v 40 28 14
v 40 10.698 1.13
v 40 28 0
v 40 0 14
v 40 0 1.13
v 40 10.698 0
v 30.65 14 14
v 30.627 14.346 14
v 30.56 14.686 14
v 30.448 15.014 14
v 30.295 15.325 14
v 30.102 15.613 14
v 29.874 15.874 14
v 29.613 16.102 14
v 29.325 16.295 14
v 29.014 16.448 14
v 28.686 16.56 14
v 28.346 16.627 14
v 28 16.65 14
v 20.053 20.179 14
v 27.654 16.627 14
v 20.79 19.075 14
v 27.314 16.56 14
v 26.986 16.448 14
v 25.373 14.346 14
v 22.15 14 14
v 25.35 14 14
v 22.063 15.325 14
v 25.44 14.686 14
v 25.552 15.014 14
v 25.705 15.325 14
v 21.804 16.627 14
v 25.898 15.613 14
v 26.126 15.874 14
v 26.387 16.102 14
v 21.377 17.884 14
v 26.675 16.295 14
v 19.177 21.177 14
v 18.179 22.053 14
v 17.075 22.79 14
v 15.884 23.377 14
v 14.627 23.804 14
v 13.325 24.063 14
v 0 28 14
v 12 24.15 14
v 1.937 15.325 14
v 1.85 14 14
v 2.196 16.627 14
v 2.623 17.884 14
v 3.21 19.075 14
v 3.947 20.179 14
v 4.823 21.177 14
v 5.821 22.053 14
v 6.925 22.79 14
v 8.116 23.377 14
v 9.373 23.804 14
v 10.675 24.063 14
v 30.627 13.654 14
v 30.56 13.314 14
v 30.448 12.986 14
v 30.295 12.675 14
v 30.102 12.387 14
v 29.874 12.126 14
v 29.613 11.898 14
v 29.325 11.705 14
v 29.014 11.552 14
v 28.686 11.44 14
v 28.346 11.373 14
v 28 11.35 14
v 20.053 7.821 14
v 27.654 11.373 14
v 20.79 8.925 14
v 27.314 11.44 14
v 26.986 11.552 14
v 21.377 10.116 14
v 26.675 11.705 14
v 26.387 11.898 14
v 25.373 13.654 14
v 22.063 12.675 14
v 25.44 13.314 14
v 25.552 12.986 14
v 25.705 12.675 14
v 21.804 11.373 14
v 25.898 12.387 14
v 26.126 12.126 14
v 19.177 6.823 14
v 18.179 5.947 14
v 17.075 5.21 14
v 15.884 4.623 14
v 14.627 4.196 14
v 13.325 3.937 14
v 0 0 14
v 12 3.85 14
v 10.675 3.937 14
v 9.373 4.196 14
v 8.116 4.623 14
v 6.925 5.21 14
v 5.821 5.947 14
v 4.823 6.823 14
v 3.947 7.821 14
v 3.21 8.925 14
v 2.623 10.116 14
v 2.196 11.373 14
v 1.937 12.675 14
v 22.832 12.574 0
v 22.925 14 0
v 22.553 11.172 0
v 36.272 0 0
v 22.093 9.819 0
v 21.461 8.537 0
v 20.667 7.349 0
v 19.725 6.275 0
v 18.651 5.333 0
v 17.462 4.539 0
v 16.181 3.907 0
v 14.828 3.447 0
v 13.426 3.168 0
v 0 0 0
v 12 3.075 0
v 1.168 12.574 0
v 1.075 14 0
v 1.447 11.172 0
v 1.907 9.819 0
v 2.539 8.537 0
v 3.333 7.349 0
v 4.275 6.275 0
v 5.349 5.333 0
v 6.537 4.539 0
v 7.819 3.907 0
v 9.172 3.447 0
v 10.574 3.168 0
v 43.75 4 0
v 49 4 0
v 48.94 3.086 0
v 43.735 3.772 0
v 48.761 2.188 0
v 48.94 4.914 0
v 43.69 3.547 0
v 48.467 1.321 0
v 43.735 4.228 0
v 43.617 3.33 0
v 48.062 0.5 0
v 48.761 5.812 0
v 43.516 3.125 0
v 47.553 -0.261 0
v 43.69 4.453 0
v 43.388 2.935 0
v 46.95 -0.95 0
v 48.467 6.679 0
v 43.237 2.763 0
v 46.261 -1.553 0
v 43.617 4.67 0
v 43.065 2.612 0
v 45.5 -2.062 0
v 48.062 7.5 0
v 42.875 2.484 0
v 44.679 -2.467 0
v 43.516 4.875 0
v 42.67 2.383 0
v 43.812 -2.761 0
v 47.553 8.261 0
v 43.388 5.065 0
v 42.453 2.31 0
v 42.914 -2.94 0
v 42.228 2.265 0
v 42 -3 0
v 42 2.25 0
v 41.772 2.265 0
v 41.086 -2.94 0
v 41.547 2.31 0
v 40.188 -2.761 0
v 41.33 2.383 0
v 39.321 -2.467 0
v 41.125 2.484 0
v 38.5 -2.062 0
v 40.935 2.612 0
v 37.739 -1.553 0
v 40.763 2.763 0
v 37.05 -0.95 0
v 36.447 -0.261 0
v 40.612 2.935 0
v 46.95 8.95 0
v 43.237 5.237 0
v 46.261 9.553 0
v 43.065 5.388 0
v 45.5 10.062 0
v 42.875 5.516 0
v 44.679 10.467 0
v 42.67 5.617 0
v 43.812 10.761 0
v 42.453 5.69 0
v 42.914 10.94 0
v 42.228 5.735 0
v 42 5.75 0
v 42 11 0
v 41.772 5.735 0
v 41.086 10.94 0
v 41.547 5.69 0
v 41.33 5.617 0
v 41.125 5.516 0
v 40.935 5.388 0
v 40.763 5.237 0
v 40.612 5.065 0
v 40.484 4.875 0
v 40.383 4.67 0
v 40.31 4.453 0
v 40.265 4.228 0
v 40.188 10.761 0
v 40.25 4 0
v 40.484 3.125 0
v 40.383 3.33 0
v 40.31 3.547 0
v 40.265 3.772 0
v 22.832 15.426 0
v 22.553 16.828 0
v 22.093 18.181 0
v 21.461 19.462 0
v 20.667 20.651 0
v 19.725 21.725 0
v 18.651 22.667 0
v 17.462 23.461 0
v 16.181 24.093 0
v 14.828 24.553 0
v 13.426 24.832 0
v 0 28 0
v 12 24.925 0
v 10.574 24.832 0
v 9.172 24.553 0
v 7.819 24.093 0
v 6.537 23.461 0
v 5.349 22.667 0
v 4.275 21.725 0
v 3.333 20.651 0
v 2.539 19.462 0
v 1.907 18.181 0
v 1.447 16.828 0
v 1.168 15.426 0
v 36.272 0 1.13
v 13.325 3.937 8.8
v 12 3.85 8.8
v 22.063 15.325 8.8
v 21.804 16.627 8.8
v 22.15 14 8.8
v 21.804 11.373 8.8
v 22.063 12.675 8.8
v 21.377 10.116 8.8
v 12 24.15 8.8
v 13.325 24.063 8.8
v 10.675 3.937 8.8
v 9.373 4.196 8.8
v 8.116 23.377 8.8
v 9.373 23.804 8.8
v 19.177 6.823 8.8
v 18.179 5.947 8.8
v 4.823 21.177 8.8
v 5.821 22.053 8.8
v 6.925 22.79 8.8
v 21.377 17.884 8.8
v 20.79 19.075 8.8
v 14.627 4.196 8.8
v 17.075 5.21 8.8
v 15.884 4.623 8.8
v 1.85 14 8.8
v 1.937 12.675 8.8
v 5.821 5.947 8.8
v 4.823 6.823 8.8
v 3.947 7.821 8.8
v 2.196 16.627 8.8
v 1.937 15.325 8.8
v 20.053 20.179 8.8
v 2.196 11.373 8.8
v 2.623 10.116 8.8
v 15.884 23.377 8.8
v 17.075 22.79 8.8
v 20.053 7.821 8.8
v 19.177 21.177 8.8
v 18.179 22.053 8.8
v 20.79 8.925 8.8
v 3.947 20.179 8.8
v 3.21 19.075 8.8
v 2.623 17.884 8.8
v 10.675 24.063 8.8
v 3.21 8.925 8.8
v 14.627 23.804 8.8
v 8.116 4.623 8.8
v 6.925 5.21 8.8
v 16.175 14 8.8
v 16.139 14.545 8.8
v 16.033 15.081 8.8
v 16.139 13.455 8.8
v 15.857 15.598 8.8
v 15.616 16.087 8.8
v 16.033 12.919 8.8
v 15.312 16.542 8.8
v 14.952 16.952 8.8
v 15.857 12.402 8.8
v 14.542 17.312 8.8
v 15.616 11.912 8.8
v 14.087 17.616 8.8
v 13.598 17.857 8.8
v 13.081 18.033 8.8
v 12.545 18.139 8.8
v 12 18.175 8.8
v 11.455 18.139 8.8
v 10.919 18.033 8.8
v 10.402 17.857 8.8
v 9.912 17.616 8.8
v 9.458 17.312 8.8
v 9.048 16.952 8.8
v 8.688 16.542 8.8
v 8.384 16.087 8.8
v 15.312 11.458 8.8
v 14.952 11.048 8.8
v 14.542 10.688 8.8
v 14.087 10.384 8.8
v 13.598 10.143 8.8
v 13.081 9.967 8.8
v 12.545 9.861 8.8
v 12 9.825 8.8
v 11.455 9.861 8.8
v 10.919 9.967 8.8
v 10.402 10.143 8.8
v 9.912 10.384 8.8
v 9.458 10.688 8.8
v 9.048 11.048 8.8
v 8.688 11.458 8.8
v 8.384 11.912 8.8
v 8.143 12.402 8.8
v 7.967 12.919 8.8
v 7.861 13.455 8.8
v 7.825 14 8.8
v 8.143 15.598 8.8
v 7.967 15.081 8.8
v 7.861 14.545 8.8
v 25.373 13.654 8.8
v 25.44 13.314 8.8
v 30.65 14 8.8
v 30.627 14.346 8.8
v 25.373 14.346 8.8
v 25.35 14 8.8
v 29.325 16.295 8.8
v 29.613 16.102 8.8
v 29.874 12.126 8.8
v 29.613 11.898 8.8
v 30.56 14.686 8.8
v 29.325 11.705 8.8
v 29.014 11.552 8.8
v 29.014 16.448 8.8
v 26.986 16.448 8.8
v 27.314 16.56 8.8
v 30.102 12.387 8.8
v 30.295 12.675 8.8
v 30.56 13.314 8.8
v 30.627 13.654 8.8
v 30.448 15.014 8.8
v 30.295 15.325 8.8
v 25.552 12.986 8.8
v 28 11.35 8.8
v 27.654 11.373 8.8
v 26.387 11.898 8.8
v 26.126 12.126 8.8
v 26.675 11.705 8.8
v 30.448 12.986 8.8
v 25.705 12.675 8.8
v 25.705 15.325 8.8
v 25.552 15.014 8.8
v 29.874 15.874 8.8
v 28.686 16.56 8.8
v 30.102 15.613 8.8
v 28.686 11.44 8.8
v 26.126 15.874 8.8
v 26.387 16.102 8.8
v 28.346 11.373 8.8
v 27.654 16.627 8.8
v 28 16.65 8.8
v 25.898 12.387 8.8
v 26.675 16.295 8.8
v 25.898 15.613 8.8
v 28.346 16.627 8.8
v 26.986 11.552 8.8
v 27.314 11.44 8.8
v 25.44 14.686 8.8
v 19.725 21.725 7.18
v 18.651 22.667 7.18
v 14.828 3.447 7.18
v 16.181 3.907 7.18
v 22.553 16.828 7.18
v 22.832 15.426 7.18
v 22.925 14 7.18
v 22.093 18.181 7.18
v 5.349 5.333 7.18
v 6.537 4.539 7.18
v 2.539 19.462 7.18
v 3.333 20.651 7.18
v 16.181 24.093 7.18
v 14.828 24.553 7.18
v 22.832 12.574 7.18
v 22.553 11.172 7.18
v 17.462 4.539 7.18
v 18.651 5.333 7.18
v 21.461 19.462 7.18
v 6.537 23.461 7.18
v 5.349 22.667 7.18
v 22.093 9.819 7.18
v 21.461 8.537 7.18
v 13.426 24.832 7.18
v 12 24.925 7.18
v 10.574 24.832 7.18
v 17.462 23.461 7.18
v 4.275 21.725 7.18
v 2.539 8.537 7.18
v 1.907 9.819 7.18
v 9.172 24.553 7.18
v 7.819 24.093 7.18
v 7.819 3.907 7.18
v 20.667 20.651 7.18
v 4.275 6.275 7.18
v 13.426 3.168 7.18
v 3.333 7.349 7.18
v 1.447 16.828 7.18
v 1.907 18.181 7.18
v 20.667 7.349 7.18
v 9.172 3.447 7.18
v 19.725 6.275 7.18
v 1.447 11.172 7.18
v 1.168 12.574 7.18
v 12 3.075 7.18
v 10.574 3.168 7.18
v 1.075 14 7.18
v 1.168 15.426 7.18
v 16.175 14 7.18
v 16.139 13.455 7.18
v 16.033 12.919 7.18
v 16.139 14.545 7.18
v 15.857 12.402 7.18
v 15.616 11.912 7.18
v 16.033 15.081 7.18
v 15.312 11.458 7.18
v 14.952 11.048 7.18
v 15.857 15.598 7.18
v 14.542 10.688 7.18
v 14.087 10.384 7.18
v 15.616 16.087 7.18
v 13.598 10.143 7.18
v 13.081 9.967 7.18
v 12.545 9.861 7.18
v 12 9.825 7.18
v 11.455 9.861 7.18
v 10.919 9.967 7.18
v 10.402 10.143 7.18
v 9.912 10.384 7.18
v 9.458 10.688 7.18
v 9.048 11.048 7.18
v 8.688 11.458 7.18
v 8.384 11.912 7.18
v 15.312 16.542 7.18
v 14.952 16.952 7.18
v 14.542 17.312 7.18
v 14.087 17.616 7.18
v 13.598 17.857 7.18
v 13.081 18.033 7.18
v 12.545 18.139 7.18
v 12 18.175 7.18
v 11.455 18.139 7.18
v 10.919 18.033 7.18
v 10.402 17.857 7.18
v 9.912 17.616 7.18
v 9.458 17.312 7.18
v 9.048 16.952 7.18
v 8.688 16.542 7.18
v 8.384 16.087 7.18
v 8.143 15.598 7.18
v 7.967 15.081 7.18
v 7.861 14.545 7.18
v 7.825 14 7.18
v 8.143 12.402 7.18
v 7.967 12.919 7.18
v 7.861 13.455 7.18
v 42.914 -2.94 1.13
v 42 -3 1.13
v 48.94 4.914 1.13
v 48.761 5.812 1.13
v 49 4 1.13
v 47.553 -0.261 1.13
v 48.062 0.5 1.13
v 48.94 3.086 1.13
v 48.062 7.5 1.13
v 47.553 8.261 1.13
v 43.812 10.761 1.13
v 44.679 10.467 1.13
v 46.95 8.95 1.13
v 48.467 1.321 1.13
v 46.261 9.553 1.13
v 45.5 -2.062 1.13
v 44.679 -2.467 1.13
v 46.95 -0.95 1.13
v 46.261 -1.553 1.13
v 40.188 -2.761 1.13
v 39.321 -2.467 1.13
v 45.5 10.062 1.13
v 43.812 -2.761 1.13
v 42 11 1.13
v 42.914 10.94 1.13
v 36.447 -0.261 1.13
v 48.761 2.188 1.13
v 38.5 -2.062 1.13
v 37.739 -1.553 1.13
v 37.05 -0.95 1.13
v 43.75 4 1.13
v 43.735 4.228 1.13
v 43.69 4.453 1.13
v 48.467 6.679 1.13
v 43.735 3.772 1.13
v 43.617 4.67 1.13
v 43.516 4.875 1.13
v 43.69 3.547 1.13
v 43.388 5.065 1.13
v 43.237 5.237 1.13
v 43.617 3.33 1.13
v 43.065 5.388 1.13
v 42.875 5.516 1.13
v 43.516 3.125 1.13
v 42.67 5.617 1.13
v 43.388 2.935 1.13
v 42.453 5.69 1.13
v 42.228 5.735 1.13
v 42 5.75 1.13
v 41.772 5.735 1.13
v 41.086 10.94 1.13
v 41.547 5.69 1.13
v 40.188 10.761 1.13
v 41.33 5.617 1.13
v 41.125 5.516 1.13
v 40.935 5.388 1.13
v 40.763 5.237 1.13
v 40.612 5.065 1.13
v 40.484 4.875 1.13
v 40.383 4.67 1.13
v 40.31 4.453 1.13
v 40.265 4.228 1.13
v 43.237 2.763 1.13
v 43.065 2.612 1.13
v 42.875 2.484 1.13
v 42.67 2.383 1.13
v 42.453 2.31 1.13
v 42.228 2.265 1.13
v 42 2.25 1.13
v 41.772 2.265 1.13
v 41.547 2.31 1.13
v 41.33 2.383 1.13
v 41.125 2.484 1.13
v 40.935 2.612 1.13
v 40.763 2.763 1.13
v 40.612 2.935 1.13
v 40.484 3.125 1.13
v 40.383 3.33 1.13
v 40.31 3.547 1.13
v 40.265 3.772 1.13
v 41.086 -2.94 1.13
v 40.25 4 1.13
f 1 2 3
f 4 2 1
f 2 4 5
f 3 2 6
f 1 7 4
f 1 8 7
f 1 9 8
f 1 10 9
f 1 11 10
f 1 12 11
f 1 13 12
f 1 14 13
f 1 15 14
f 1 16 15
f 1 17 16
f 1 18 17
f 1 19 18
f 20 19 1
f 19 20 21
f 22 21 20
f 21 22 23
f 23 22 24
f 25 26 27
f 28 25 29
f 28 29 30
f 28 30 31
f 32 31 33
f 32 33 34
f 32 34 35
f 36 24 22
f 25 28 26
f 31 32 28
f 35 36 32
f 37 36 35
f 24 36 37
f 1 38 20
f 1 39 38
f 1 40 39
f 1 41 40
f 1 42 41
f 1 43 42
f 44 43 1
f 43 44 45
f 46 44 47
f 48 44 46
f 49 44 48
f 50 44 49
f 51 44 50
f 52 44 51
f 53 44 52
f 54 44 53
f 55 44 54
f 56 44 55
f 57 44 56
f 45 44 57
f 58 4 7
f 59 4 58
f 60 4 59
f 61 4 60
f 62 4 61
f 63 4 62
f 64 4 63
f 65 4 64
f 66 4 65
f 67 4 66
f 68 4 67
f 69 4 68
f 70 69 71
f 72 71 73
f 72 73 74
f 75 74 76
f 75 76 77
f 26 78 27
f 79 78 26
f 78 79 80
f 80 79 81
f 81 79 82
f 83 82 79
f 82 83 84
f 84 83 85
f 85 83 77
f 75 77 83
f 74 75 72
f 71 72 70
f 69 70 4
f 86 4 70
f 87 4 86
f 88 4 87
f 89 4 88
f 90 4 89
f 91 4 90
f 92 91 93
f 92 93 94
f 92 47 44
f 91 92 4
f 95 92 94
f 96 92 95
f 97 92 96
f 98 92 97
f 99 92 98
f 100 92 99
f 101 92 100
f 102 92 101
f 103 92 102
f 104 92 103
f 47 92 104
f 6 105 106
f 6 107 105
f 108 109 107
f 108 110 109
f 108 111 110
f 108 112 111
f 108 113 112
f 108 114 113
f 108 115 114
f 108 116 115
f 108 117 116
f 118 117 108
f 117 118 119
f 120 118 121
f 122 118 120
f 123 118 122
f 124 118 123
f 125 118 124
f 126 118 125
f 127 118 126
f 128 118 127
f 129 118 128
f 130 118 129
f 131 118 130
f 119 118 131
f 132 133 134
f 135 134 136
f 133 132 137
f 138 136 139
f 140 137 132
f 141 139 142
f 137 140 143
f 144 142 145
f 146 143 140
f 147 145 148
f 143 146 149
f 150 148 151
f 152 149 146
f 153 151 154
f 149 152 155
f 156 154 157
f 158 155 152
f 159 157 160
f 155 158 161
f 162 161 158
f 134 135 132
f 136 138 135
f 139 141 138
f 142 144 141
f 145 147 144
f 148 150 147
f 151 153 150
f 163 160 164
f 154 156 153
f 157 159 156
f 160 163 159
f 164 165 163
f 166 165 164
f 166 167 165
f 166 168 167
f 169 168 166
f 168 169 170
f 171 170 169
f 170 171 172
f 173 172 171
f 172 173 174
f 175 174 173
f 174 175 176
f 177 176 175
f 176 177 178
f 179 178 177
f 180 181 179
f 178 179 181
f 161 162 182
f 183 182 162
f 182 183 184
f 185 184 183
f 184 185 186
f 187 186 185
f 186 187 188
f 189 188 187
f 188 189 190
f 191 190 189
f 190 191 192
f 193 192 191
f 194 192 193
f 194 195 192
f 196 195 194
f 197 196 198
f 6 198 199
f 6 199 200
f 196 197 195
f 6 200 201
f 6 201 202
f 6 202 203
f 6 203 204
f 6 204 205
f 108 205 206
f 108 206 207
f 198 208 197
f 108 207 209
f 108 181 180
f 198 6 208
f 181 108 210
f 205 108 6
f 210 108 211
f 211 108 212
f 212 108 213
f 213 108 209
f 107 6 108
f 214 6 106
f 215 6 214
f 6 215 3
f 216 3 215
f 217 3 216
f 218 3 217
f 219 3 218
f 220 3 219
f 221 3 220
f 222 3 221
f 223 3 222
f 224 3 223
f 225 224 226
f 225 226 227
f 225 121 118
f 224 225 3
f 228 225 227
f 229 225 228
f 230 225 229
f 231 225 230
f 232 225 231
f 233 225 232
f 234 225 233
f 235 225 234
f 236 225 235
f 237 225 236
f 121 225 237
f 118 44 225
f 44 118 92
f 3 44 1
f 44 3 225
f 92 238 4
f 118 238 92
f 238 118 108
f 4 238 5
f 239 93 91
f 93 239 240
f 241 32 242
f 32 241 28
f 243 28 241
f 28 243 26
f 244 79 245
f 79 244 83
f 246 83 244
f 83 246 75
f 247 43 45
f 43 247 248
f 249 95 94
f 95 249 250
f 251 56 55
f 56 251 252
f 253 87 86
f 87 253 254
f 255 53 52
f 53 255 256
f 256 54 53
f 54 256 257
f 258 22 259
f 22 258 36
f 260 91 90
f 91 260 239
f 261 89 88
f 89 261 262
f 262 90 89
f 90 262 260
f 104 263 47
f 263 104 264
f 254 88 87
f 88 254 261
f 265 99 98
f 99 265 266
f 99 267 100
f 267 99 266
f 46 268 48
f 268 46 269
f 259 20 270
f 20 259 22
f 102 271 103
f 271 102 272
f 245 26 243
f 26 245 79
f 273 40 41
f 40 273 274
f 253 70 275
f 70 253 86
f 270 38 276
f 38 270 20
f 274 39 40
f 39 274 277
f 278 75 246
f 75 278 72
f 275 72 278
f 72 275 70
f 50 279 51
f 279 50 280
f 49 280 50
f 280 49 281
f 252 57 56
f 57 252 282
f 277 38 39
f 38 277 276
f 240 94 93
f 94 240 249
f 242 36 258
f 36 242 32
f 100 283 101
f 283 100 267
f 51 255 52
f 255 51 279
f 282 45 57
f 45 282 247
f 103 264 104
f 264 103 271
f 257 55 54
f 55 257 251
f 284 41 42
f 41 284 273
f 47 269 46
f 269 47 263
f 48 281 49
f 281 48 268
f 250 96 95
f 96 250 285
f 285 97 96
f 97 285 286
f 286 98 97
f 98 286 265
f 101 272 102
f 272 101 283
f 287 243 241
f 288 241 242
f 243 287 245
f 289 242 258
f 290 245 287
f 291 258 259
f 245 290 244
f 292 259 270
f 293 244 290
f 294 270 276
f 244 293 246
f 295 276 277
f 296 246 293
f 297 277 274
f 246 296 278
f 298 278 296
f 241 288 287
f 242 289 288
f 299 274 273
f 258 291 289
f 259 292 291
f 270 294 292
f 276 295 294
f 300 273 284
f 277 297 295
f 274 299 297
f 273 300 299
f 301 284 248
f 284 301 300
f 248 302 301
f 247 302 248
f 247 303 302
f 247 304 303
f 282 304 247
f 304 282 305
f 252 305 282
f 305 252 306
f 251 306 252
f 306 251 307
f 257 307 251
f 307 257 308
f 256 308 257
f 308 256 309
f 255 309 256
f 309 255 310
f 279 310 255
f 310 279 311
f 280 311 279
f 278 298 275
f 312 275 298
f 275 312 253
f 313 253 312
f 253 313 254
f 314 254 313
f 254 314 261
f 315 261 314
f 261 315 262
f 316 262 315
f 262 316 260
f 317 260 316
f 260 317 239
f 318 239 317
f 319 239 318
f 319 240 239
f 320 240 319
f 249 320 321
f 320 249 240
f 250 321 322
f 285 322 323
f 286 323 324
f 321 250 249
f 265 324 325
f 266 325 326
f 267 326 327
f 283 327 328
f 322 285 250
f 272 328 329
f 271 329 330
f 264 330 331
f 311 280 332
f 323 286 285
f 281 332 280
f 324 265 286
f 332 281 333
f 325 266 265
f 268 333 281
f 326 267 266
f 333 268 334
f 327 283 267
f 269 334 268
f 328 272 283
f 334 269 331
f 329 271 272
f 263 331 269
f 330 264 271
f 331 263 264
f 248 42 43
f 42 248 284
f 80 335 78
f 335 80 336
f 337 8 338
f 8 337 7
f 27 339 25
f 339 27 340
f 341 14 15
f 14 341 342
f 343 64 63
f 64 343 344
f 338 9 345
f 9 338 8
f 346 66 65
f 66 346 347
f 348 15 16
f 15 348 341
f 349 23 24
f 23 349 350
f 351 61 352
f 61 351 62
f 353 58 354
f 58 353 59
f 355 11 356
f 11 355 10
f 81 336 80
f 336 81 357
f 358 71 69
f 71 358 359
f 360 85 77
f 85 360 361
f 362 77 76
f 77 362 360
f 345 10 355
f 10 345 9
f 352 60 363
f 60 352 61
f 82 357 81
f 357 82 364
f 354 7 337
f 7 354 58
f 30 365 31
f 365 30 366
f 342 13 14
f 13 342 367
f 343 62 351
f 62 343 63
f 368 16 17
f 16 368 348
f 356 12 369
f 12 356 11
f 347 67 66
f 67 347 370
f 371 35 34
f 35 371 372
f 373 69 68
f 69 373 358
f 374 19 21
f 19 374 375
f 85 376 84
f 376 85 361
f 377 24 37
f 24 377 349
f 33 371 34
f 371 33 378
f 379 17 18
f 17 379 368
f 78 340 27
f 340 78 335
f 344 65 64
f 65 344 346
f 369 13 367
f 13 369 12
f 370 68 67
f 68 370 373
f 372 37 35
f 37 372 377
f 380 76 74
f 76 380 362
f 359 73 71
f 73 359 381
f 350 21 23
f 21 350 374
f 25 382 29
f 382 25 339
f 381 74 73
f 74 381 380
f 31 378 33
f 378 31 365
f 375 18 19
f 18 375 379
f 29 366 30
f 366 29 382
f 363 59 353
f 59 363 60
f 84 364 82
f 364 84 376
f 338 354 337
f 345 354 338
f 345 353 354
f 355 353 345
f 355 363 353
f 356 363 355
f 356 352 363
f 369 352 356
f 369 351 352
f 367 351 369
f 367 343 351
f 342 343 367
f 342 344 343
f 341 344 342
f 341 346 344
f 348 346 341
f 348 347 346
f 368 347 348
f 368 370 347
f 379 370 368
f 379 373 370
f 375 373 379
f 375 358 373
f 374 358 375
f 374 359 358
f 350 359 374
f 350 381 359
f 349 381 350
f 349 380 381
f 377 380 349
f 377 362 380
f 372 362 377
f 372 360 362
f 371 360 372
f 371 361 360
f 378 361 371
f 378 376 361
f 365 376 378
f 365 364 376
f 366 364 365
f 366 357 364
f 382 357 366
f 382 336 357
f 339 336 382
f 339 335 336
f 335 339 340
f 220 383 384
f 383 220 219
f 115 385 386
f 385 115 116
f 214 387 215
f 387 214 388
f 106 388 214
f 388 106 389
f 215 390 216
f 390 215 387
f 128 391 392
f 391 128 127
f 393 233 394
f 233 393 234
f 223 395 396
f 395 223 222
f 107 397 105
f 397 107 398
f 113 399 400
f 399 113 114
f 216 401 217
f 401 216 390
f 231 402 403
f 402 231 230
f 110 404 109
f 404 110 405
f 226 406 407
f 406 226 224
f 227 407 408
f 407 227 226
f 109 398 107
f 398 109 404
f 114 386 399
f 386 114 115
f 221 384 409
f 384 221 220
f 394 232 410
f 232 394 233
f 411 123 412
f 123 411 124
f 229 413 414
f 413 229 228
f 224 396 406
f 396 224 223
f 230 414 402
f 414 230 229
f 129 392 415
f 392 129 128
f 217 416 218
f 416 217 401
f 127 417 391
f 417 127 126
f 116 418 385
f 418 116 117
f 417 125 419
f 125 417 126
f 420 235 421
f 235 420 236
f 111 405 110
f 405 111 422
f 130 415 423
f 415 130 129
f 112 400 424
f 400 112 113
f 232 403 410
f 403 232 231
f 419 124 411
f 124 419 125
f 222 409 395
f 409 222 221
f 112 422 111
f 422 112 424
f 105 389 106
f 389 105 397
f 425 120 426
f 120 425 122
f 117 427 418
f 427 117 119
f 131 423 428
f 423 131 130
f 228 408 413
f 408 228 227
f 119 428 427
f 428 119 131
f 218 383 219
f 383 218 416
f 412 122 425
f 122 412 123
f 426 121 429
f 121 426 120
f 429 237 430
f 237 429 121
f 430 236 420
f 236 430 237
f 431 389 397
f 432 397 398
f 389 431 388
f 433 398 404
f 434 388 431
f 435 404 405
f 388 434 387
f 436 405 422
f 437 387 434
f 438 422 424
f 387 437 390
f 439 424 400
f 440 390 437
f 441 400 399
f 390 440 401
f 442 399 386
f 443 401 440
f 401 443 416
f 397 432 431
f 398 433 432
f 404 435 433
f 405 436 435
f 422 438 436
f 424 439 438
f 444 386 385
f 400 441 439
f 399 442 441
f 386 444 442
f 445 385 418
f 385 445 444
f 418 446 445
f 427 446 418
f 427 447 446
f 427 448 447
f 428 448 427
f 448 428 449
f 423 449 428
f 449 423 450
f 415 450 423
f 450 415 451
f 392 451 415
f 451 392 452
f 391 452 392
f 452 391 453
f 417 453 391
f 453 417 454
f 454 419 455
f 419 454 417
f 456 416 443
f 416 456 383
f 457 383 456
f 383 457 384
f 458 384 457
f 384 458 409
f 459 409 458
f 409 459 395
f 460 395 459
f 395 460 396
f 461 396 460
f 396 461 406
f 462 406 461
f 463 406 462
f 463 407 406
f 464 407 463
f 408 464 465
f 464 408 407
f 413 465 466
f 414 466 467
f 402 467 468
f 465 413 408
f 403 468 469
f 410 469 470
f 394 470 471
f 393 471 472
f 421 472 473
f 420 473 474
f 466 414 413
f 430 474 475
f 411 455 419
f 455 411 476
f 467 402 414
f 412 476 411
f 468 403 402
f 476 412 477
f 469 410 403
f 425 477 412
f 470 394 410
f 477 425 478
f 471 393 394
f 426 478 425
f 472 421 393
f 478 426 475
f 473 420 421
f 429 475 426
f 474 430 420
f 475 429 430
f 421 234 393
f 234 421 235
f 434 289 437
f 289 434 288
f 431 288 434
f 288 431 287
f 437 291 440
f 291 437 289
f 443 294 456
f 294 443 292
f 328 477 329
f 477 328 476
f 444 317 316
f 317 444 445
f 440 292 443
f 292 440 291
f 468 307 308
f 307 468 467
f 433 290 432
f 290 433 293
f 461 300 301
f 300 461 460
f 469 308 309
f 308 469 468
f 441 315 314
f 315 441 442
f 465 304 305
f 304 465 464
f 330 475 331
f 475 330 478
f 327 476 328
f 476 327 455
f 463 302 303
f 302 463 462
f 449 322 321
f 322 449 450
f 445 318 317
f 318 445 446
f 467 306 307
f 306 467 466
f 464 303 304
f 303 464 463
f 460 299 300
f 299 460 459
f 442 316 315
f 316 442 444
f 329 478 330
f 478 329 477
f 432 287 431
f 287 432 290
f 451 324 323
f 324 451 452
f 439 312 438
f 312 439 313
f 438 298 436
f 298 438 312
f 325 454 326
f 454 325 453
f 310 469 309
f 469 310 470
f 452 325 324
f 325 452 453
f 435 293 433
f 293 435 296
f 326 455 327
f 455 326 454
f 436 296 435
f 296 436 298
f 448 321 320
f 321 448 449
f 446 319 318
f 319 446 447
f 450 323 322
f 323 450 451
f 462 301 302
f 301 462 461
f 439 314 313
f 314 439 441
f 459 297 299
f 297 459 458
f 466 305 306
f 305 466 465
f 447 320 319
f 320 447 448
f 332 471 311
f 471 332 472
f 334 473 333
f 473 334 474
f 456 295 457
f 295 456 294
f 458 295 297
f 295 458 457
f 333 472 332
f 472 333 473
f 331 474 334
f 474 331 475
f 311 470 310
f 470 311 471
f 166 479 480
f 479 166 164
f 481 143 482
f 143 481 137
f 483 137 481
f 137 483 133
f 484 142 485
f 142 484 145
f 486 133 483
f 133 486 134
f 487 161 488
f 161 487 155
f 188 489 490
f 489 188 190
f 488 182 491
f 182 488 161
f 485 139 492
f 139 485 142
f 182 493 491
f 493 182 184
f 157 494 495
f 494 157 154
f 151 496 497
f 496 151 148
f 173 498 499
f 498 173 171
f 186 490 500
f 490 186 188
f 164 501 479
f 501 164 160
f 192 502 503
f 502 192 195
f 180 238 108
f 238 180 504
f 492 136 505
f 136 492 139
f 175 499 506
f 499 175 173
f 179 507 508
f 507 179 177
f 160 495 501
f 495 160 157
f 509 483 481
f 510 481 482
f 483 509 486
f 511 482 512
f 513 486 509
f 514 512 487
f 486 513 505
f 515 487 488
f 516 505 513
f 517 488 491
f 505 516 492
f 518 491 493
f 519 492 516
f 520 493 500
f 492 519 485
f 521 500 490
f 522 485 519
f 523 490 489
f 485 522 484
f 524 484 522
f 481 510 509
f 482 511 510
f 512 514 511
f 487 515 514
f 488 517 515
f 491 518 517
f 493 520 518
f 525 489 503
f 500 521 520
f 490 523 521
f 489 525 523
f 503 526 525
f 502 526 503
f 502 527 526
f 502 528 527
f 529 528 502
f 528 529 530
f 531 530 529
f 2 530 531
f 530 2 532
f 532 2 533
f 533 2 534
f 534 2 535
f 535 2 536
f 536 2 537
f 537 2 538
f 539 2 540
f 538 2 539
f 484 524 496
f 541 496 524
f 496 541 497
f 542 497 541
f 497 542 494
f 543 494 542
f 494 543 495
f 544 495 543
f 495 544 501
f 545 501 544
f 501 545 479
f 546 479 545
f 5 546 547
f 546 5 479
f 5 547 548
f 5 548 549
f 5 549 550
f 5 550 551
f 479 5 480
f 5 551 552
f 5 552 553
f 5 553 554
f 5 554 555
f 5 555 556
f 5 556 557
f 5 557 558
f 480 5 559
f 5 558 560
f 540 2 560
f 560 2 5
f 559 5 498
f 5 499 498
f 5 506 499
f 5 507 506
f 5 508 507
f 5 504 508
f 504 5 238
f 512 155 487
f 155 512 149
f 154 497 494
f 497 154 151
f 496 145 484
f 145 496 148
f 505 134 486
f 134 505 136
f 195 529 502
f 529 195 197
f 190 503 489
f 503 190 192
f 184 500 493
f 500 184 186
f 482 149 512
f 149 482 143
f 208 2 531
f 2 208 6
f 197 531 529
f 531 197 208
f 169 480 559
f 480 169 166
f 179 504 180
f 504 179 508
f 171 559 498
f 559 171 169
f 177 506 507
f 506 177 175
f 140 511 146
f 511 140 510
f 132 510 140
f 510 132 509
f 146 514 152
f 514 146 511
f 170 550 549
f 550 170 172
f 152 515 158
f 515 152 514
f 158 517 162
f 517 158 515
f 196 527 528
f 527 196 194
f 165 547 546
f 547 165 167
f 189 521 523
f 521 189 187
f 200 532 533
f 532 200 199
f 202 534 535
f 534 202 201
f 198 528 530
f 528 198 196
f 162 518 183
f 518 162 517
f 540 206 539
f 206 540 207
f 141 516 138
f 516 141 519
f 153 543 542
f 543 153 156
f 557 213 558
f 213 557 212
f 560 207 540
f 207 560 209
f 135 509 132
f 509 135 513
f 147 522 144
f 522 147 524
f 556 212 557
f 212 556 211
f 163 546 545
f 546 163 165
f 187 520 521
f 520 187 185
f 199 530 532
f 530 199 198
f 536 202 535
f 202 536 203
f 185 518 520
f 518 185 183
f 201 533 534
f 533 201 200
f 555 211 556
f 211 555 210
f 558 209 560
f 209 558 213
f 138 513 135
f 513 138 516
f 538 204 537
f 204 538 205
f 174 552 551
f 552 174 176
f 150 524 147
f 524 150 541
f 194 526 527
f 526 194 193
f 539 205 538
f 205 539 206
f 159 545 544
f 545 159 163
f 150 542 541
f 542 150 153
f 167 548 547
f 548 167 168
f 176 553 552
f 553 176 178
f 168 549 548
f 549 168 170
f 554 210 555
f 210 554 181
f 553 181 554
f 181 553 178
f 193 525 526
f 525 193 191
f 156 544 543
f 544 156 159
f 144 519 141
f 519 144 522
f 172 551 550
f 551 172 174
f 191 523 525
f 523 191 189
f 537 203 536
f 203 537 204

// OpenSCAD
// file: parameters.scad
// =============================================================================
// Gen-BB Vernier flux-claw ultra - WOUND-AWARE (HARD GATE)
// Dual-rotor vernier: Rotor B +22.5 deg vs 12-slot stator; O5 flux claws
// =============================================================================

wire_awg            = 26;
wire_od             = 0.45;
turns               = 215;      // +5 vs Gen-AY 210
fill                = 0.70;
layers_per_face     = 2;
wind_build_axial    = layers_per_face * wire_od * fill;   // 0.63 mm
wind_build_radial   = 3 * wire_od * fill;                 // 0.945 mm

coil_id_r           = 14.0;
coil_od_r           = 61.0;
span_deg            = 25.0;
former_web          = 1.20;     // print floor LB walls
flange_t            = 0.60;
wall                = 1.2;
slot_w              = 2.4;
mount_hole          = 3.5;
tab_len             = 7.0;

former_bare_h       = former_web + 2 * flange_t;            // 2.40 mm
coil_envelope_h     = former_bare_h + 2 * wind_build_axial; // 3.66 mm

run_clear           = 0.50;
gap_spacer_h        = run_clear + wind_build_axial;         // 1.13 mm
m2m                 = coil_envelope_h + 2 * run_clear;      // 4.66 mm

coil_stations       = 12;
bay_r_in            = coil_id_r - 2.0 - wind_build_radial;
bay_r_out           = coil_od_r + 2.0 + wind_build_radial;
bay_span            = span_deg + 4.0;
bay_offset          = 2.0;
stator_thick        = former_bare_h;
stator_od           = 160.0;
shaft_clear_stator  = 34.0;
coil_mount_r        = 25.5;

large_pocket_d      = 20.3;
small_pocket_d      = 5.3;
pocket_h            = 5.2;
large_n             = 8;
R_large             = 37.5;     // closer to copper centroid vs AY R=38.0
R_small_inner       = 23.5;
R_small_mid         = 37.5;
R_small_outer       = 53.5;
carrier_od          = 156.0;
carrier_thick       = 7.5;
hub_h               = 10.0;
hub_od              = 30.0;
rotor_b_offset_deg  = 22.5;     // vernier offset vs 12-slot stator

shaft_bore          = 8.35;
bearing_d           = 21.85;
bearing_h           = 7.2;
m3_clear            = 3.5;
bolt_r_inner        = 36.0;
bolt_n_inner        = 6;
flange_bolt_r       = 72.0;
flange_bolt_n       = 6;
brace_r             = 68.0;
brace_d             = 4.3;
brace_n             = 4;

spacer_pad_od       = 14.0;
spacer_pad_id       = m3_clear;
endbell_od          = 160.0;
endbell_thick       = 8.0;
endbell_shaft_clear = 10.0;

$fn = 64;
// main file
// Gen-AY fit coupon — magnet pockets + 608 + spacer height
include <parameters.scad>;
$fn = 48;
block_w = 40; block_d = 28; block_h = 14;
difference() {
    cube([block_w, block_d, block_h]);
    translate([12, block_d/2, block_h - pocket_h])
        cylinder(d=large_pocket_d, h=pocket_h + 0.2);
    translate([28, block_d/2, block_h - pocket_h])
        cylinder(d=small_pocket_d, h=pocket_h + 0.2);
    translate([12, block_d/2, -0.02])
        cylinder(d=bearing_d, h=bearing_h);
    translate([12, block_d/2, -0.1])
        cylinder(d=shaft_bore, h=block_h + 1);
}
translate([block_w + 2, 4, 0])
    difference() {
        cylinder(d=spacer_pad_od, h=gap_spacer_h);
        translate([0, 0, -0.1]) cylinder(d=spacer_pad_id, h=gap_spacer_h + 0.2);
    }
